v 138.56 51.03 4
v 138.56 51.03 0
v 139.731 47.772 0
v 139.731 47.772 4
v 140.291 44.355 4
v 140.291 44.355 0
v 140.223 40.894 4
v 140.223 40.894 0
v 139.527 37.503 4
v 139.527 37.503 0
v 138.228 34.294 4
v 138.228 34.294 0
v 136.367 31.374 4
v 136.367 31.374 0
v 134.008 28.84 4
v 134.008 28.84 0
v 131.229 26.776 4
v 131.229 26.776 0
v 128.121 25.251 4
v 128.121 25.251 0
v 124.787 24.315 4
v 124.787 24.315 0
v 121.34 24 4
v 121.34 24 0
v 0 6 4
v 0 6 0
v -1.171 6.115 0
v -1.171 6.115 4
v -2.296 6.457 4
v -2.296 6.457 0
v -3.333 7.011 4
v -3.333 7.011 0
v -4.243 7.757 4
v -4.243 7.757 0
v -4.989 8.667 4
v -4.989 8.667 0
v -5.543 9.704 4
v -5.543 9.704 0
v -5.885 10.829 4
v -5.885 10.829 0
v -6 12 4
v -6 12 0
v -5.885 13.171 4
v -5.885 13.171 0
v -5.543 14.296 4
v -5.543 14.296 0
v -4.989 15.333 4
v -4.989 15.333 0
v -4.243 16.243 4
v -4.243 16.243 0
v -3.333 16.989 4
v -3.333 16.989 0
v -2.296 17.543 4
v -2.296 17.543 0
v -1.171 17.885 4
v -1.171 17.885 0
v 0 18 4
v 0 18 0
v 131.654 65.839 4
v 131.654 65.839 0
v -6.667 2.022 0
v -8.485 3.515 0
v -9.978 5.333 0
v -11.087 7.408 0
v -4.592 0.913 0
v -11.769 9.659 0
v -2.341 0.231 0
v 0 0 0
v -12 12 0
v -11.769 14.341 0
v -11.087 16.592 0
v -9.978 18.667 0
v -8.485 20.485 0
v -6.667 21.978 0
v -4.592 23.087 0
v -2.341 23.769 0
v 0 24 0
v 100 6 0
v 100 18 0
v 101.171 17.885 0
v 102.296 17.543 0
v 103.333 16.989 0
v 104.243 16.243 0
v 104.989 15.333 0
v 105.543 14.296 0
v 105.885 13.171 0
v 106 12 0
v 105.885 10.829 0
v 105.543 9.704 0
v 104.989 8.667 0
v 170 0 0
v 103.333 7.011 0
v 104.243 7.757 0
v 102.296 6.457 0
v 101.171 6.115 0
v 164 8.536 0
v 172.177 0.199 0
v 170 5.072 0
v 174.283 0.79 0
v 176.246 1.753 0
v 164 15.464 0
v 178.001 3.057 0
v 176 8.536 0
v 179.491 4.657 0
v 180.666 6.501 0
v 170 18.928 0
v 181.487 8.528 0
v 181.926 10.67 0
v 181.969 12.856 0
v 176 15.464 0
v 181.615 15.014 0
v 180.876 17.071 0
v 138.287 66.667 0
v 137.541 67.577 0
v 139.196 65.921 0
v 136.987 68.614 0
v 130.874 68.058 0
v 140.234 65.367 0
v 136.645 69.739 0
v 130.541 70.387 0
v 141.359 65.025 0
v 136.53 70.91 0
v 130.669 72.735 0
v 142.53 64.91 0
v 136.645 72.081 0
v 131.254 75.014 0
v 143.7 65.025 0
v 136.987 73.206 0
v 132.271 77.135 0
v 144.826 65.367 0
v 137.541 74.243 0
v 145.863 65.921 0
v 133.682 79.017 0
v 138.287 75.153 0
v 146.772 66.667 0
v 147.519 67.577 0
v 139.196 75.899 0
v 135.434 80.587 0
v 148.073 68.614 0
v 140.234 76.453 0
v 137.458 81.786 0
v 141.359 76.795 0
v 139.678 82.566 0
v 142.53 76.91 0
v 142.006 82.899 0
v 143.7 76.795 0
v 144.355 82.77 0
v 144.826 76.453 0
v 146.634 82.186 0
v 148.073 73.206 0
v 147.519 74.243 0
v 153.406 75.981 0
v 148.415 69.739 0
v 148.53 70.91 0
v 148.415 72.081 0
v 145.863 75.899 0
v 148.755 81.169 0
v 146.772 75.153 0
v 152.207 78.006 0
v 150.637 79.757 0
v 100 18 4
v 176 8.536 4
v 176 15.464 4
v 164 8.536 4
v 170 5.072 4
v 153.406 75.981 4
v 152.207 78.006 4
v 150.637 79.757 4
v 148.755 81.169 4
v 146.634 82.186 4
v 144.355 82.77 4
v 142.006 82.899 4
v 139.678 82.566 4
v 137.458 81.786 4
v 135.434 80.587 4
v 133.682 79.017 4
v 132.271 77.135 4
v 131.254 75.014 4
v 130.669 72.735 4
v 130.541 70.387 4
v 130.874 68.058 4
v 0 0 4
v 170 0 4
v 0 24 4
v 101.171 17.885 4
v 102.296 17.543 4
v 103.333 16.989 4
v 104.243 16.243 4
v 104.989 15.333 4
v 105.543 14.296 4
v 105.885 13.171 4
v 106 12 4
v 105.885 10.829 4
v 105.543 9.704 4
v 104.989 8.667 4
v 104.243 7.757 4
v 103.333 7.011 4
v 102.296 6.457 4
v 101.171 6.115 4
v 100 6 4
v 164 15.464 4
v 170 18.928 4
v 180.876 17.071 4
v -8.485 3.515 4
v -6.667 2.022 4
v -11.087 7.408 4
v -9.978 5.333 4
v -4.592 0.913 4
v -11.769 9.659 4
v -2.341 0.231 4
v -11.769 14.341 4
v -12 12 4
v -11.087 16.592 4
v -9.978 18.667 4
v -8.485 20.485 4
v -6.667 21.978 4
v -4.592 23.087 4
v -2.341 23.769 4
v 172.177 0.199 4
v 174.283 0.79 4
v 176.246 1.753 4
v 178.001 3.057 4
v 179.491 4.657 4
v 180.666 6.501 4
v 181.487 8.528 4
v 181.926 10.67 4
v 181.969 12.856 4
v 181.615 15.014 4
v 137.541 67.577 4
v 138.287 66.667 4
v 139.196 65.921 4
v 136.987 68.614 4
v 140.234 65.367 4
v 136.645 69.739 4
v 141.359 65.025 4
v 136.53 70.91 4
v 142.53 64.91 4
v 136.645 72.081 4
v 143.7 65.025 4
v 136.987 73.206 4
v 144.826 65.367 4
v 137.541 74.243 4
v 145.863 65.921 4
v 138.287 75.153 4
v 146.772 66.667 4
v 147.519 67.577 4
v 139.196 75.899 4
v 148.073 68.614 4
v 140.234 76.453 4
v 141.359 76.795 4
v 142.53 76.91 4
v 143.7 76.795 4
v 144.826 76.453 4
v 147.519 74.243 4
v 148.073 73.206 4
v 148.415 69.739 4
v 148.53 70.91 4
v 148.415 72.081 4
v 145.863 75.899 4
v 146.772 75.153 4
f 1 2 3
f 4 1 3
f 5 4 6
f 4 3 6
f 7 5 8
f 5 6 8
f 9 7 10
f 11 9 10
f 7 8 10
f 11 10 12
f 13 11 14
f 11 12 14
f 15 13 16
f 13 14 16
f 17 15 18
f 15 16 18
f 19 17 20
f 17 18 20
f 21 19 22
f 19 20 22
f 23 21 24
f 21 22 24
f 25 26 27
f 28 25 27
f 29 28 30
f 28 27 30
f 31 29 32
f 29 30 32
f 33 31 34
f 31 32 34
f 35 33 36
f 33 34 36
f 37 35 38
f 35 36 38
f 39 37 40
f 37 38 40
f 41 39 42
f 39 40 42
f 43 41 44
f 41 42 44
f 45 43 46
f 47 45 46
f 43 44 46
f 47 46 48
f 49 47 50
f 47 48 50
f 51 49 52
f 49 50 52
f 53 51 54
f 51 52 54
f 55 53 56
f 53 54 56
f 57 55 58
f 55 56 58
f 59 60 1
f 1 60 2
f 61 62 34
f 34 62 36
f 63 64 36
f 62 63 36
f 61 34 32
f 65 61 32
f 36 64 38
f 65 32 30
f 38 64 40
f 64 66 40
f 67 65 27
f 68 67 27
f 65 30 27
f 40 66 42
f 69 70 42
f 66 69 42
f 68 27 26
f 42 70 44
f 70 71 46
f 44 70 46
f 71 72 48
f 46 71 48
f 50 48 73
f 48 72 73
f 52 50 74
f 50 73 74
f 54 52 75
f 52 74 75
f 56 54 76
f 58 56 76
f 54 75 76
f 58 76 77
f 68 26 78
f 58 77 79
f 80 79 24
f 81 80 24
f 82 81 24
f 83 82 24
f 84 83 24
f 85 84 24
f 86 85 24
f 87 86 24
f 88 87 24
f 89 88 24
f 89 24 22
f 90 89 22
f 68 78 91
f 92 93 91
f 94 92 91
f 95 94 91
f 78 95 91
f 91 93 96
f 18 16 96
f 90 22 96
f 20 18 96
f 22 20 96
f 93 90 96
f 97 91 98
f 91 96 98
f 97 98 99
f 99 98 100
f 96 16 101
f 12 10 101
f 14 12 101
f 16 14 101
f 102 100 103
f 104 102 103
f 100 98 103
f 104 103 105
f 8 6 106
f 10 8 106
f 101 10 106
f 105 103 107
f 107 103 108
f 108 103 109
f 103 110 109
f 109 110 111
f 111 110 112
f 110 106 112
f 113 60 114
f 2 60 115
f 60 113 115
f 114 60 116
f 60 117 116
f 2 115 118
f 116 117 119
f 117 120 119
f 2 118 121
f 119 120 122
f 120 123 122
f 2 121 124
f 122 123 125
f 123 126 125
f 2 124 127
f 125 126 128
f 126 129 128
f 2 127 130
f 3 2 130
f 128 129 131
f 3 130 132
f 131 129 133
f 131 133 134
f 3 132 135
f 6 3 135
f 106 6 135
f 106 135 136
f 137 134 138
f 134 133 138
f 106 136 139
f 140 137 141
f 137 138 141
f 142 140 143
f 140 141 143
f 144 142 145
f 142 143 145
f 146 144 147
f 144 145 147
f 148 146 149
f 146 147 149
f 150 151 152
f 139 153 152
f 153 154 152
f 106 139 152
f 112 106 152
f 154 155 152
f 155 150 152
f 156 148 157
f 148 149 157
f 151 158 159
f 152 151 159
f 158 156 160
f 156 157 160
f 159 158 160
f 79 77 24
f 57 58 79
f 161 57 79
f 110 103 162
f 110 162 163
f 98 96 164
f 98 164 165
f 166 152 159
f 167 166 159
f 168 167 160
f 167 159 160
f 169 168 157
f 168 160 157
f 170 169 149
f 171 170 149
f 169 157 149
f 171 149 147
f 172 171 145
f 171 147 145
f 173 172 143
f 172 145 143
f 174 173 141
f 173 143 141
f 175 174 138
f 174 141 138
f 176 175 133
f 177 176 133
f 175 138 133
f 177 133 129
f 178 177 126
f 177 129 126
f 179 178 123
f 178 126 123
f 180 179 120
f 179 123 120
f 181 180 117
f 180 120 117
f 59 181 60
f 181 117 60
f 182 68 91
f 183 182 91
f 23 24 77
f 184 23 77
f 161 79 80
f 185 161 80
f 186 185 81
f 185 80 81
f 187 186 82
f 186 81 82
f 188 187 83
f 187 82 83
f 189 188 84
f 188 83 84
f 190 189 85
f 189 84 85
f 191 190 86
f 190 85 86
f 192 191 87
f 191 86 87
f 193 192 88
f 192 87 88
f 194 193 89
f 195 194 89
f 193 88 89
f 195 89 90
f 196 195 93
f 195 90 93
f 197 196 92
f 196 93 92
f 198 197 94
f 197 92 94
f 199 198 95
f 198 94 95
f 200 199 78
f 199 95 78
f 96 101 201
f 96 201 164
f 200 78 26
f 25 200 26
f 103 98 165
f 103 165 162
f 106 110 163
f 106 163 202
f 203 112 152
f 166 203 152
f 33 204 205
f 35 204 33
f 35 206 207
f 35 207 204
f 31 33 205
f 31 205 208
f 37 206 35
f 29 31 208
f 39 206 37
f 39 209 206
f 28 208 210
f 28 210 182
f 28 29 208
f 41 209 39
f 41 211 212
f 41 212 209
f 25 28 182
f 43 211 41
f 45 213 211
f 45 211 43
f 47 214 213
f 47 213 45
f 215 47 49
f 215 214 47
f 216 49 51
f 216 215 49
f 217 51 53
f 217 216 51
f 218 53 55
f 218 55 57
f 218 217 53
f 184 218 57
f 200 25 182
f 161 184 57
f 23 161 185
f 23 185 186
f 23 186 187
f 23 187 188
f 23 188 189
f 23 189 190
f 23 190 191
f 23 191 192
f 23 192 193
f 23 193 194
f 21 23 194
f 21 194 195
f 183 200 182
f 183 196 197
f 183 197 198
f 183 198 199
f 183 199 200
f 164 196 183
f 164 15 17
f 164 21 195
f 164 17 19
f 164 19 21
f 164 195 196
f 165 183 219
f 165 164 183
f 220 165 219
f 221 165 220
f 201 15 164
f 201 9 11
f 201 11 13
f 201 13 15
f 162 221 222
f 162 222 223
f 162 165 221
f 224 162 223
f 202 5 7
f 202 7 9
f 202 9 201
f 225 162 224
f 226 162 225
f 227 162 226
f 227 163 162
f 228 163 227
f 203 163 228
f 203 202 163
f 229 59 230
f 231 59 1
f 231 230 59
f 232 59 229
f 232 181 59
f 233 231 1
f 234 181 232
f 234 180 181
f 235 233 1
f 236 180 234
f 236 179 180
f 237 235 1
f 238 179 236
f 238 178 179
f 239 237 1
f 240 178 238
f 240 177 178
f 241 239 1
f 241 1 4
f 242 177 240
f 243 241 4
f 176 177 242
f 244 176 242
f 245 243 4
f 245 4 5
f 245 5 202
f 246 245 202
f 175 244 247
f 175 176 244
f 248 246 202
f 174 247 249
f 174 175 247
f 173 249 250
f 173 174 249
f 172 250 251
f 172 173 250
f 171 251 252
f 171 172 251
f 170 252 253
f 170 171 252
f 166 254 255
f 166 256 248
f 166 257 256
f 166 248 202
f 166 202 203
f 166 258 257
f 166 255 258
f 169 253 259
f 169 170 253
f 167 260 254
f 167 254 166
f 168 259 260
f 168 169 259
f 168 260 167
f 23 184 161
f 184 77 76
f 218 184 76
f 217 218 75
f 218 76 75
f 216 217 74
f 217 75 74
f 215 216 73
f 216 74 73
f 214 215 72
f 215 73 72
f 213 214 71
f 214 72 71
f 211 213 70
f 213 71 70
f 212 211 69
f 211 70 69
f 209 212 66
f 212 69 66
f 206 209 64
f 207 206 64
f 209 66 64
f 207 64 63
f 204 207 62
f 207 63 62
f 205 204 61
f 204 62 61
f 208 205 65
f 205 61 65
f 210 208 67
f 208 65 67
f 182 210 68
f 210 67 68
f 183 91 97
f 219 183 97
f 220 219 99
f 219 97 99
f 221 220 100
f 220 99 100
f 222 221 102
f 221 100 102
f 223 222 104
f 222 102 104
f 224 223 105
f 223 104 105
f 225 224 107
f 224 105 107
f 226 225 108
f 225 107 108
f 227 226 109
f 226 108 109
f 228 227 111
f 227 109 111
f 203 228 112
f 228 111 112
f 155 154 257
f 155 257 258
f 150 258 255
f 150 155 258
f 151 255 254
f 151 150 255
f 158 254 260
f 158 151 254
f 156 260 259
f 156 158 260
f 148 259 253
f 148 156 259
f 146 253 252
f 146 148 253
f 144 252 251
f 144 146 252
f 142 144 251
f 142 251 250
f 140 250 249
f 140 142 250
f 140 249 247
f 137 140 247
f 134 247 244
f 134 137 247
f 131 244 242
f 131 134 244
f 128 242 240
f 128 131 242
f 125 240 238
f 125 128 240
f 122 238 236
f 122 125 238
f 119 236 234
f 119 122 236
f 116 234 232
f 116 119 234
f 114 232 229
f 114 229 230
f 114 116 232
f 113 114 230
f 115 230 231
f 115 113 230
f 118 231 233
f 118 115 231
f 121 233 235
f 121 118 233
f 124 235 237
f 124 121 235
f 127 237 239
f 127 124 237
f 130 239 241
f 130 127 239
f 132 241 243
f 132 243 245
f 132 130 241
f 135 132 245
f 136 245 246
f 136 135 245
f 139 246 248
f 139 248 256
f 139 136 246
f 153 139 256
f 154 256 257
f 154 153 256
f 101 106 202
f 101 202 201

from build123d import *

# Parameters (mm, degrees)
SKETCH1_R           = 6
BOSS_EXTRUDE1_DEPTH = 4


with BuildPart() as part:
    # Sketch1 → Boss-Extrude1 (new body)
    with BuildSketch(Plane.XY):
        with BuildLine():
            Line((0, 0), (170, 0))
            ThreePointArc((170, 0), (180.12069735, 5.5524047), (180.875693444, 17.071419141))
            Line((180.875693444, 17.071419141), (153.405506431, 75.981425298))
            ThreePointArc((153.405506431, 75.981425298), (137.458393846, 81.785699602), (131.654119542, 65.838587016))
            Line((131.654119542, 65.838587016), (138.559595063, 51.029746973))
            ThreePointArc((138.559595063, 51.029746973), (137.36418458, 32.791307441), (121.339747109, 24))
            Line((121.339747109, 24), (0, 24))
            ThreePointArc((0, 24), (-12, 12), (0, 0))
        make_face()
        with Locations((142.529812987, 70.910006157)):
            Circle(SKETCH1_R, mode=Mode.SUBTRACT)
        with BuildLine():
            Line((0, 18), (100, 18))
            ThreePointArc((100, 18), (106, 12), (100, 6))
            Line((100, 6), (0, 6))
            ThreePointArc((0, 6), (-6, 12), (0, 18))
        make_face(mode=Mode.SUBTRACT)
        Polygon((170, 18.92820323), (164, 15.464101615), (164, 8.535898385), (170, 5.07179677), (176, 8.535898385), (176, 15.464101615), align=None, mode=Mode.SUBTRACT)
    extrude(amount=BOSS_EXTRUDE1_DEPTH)


solid = part.part
